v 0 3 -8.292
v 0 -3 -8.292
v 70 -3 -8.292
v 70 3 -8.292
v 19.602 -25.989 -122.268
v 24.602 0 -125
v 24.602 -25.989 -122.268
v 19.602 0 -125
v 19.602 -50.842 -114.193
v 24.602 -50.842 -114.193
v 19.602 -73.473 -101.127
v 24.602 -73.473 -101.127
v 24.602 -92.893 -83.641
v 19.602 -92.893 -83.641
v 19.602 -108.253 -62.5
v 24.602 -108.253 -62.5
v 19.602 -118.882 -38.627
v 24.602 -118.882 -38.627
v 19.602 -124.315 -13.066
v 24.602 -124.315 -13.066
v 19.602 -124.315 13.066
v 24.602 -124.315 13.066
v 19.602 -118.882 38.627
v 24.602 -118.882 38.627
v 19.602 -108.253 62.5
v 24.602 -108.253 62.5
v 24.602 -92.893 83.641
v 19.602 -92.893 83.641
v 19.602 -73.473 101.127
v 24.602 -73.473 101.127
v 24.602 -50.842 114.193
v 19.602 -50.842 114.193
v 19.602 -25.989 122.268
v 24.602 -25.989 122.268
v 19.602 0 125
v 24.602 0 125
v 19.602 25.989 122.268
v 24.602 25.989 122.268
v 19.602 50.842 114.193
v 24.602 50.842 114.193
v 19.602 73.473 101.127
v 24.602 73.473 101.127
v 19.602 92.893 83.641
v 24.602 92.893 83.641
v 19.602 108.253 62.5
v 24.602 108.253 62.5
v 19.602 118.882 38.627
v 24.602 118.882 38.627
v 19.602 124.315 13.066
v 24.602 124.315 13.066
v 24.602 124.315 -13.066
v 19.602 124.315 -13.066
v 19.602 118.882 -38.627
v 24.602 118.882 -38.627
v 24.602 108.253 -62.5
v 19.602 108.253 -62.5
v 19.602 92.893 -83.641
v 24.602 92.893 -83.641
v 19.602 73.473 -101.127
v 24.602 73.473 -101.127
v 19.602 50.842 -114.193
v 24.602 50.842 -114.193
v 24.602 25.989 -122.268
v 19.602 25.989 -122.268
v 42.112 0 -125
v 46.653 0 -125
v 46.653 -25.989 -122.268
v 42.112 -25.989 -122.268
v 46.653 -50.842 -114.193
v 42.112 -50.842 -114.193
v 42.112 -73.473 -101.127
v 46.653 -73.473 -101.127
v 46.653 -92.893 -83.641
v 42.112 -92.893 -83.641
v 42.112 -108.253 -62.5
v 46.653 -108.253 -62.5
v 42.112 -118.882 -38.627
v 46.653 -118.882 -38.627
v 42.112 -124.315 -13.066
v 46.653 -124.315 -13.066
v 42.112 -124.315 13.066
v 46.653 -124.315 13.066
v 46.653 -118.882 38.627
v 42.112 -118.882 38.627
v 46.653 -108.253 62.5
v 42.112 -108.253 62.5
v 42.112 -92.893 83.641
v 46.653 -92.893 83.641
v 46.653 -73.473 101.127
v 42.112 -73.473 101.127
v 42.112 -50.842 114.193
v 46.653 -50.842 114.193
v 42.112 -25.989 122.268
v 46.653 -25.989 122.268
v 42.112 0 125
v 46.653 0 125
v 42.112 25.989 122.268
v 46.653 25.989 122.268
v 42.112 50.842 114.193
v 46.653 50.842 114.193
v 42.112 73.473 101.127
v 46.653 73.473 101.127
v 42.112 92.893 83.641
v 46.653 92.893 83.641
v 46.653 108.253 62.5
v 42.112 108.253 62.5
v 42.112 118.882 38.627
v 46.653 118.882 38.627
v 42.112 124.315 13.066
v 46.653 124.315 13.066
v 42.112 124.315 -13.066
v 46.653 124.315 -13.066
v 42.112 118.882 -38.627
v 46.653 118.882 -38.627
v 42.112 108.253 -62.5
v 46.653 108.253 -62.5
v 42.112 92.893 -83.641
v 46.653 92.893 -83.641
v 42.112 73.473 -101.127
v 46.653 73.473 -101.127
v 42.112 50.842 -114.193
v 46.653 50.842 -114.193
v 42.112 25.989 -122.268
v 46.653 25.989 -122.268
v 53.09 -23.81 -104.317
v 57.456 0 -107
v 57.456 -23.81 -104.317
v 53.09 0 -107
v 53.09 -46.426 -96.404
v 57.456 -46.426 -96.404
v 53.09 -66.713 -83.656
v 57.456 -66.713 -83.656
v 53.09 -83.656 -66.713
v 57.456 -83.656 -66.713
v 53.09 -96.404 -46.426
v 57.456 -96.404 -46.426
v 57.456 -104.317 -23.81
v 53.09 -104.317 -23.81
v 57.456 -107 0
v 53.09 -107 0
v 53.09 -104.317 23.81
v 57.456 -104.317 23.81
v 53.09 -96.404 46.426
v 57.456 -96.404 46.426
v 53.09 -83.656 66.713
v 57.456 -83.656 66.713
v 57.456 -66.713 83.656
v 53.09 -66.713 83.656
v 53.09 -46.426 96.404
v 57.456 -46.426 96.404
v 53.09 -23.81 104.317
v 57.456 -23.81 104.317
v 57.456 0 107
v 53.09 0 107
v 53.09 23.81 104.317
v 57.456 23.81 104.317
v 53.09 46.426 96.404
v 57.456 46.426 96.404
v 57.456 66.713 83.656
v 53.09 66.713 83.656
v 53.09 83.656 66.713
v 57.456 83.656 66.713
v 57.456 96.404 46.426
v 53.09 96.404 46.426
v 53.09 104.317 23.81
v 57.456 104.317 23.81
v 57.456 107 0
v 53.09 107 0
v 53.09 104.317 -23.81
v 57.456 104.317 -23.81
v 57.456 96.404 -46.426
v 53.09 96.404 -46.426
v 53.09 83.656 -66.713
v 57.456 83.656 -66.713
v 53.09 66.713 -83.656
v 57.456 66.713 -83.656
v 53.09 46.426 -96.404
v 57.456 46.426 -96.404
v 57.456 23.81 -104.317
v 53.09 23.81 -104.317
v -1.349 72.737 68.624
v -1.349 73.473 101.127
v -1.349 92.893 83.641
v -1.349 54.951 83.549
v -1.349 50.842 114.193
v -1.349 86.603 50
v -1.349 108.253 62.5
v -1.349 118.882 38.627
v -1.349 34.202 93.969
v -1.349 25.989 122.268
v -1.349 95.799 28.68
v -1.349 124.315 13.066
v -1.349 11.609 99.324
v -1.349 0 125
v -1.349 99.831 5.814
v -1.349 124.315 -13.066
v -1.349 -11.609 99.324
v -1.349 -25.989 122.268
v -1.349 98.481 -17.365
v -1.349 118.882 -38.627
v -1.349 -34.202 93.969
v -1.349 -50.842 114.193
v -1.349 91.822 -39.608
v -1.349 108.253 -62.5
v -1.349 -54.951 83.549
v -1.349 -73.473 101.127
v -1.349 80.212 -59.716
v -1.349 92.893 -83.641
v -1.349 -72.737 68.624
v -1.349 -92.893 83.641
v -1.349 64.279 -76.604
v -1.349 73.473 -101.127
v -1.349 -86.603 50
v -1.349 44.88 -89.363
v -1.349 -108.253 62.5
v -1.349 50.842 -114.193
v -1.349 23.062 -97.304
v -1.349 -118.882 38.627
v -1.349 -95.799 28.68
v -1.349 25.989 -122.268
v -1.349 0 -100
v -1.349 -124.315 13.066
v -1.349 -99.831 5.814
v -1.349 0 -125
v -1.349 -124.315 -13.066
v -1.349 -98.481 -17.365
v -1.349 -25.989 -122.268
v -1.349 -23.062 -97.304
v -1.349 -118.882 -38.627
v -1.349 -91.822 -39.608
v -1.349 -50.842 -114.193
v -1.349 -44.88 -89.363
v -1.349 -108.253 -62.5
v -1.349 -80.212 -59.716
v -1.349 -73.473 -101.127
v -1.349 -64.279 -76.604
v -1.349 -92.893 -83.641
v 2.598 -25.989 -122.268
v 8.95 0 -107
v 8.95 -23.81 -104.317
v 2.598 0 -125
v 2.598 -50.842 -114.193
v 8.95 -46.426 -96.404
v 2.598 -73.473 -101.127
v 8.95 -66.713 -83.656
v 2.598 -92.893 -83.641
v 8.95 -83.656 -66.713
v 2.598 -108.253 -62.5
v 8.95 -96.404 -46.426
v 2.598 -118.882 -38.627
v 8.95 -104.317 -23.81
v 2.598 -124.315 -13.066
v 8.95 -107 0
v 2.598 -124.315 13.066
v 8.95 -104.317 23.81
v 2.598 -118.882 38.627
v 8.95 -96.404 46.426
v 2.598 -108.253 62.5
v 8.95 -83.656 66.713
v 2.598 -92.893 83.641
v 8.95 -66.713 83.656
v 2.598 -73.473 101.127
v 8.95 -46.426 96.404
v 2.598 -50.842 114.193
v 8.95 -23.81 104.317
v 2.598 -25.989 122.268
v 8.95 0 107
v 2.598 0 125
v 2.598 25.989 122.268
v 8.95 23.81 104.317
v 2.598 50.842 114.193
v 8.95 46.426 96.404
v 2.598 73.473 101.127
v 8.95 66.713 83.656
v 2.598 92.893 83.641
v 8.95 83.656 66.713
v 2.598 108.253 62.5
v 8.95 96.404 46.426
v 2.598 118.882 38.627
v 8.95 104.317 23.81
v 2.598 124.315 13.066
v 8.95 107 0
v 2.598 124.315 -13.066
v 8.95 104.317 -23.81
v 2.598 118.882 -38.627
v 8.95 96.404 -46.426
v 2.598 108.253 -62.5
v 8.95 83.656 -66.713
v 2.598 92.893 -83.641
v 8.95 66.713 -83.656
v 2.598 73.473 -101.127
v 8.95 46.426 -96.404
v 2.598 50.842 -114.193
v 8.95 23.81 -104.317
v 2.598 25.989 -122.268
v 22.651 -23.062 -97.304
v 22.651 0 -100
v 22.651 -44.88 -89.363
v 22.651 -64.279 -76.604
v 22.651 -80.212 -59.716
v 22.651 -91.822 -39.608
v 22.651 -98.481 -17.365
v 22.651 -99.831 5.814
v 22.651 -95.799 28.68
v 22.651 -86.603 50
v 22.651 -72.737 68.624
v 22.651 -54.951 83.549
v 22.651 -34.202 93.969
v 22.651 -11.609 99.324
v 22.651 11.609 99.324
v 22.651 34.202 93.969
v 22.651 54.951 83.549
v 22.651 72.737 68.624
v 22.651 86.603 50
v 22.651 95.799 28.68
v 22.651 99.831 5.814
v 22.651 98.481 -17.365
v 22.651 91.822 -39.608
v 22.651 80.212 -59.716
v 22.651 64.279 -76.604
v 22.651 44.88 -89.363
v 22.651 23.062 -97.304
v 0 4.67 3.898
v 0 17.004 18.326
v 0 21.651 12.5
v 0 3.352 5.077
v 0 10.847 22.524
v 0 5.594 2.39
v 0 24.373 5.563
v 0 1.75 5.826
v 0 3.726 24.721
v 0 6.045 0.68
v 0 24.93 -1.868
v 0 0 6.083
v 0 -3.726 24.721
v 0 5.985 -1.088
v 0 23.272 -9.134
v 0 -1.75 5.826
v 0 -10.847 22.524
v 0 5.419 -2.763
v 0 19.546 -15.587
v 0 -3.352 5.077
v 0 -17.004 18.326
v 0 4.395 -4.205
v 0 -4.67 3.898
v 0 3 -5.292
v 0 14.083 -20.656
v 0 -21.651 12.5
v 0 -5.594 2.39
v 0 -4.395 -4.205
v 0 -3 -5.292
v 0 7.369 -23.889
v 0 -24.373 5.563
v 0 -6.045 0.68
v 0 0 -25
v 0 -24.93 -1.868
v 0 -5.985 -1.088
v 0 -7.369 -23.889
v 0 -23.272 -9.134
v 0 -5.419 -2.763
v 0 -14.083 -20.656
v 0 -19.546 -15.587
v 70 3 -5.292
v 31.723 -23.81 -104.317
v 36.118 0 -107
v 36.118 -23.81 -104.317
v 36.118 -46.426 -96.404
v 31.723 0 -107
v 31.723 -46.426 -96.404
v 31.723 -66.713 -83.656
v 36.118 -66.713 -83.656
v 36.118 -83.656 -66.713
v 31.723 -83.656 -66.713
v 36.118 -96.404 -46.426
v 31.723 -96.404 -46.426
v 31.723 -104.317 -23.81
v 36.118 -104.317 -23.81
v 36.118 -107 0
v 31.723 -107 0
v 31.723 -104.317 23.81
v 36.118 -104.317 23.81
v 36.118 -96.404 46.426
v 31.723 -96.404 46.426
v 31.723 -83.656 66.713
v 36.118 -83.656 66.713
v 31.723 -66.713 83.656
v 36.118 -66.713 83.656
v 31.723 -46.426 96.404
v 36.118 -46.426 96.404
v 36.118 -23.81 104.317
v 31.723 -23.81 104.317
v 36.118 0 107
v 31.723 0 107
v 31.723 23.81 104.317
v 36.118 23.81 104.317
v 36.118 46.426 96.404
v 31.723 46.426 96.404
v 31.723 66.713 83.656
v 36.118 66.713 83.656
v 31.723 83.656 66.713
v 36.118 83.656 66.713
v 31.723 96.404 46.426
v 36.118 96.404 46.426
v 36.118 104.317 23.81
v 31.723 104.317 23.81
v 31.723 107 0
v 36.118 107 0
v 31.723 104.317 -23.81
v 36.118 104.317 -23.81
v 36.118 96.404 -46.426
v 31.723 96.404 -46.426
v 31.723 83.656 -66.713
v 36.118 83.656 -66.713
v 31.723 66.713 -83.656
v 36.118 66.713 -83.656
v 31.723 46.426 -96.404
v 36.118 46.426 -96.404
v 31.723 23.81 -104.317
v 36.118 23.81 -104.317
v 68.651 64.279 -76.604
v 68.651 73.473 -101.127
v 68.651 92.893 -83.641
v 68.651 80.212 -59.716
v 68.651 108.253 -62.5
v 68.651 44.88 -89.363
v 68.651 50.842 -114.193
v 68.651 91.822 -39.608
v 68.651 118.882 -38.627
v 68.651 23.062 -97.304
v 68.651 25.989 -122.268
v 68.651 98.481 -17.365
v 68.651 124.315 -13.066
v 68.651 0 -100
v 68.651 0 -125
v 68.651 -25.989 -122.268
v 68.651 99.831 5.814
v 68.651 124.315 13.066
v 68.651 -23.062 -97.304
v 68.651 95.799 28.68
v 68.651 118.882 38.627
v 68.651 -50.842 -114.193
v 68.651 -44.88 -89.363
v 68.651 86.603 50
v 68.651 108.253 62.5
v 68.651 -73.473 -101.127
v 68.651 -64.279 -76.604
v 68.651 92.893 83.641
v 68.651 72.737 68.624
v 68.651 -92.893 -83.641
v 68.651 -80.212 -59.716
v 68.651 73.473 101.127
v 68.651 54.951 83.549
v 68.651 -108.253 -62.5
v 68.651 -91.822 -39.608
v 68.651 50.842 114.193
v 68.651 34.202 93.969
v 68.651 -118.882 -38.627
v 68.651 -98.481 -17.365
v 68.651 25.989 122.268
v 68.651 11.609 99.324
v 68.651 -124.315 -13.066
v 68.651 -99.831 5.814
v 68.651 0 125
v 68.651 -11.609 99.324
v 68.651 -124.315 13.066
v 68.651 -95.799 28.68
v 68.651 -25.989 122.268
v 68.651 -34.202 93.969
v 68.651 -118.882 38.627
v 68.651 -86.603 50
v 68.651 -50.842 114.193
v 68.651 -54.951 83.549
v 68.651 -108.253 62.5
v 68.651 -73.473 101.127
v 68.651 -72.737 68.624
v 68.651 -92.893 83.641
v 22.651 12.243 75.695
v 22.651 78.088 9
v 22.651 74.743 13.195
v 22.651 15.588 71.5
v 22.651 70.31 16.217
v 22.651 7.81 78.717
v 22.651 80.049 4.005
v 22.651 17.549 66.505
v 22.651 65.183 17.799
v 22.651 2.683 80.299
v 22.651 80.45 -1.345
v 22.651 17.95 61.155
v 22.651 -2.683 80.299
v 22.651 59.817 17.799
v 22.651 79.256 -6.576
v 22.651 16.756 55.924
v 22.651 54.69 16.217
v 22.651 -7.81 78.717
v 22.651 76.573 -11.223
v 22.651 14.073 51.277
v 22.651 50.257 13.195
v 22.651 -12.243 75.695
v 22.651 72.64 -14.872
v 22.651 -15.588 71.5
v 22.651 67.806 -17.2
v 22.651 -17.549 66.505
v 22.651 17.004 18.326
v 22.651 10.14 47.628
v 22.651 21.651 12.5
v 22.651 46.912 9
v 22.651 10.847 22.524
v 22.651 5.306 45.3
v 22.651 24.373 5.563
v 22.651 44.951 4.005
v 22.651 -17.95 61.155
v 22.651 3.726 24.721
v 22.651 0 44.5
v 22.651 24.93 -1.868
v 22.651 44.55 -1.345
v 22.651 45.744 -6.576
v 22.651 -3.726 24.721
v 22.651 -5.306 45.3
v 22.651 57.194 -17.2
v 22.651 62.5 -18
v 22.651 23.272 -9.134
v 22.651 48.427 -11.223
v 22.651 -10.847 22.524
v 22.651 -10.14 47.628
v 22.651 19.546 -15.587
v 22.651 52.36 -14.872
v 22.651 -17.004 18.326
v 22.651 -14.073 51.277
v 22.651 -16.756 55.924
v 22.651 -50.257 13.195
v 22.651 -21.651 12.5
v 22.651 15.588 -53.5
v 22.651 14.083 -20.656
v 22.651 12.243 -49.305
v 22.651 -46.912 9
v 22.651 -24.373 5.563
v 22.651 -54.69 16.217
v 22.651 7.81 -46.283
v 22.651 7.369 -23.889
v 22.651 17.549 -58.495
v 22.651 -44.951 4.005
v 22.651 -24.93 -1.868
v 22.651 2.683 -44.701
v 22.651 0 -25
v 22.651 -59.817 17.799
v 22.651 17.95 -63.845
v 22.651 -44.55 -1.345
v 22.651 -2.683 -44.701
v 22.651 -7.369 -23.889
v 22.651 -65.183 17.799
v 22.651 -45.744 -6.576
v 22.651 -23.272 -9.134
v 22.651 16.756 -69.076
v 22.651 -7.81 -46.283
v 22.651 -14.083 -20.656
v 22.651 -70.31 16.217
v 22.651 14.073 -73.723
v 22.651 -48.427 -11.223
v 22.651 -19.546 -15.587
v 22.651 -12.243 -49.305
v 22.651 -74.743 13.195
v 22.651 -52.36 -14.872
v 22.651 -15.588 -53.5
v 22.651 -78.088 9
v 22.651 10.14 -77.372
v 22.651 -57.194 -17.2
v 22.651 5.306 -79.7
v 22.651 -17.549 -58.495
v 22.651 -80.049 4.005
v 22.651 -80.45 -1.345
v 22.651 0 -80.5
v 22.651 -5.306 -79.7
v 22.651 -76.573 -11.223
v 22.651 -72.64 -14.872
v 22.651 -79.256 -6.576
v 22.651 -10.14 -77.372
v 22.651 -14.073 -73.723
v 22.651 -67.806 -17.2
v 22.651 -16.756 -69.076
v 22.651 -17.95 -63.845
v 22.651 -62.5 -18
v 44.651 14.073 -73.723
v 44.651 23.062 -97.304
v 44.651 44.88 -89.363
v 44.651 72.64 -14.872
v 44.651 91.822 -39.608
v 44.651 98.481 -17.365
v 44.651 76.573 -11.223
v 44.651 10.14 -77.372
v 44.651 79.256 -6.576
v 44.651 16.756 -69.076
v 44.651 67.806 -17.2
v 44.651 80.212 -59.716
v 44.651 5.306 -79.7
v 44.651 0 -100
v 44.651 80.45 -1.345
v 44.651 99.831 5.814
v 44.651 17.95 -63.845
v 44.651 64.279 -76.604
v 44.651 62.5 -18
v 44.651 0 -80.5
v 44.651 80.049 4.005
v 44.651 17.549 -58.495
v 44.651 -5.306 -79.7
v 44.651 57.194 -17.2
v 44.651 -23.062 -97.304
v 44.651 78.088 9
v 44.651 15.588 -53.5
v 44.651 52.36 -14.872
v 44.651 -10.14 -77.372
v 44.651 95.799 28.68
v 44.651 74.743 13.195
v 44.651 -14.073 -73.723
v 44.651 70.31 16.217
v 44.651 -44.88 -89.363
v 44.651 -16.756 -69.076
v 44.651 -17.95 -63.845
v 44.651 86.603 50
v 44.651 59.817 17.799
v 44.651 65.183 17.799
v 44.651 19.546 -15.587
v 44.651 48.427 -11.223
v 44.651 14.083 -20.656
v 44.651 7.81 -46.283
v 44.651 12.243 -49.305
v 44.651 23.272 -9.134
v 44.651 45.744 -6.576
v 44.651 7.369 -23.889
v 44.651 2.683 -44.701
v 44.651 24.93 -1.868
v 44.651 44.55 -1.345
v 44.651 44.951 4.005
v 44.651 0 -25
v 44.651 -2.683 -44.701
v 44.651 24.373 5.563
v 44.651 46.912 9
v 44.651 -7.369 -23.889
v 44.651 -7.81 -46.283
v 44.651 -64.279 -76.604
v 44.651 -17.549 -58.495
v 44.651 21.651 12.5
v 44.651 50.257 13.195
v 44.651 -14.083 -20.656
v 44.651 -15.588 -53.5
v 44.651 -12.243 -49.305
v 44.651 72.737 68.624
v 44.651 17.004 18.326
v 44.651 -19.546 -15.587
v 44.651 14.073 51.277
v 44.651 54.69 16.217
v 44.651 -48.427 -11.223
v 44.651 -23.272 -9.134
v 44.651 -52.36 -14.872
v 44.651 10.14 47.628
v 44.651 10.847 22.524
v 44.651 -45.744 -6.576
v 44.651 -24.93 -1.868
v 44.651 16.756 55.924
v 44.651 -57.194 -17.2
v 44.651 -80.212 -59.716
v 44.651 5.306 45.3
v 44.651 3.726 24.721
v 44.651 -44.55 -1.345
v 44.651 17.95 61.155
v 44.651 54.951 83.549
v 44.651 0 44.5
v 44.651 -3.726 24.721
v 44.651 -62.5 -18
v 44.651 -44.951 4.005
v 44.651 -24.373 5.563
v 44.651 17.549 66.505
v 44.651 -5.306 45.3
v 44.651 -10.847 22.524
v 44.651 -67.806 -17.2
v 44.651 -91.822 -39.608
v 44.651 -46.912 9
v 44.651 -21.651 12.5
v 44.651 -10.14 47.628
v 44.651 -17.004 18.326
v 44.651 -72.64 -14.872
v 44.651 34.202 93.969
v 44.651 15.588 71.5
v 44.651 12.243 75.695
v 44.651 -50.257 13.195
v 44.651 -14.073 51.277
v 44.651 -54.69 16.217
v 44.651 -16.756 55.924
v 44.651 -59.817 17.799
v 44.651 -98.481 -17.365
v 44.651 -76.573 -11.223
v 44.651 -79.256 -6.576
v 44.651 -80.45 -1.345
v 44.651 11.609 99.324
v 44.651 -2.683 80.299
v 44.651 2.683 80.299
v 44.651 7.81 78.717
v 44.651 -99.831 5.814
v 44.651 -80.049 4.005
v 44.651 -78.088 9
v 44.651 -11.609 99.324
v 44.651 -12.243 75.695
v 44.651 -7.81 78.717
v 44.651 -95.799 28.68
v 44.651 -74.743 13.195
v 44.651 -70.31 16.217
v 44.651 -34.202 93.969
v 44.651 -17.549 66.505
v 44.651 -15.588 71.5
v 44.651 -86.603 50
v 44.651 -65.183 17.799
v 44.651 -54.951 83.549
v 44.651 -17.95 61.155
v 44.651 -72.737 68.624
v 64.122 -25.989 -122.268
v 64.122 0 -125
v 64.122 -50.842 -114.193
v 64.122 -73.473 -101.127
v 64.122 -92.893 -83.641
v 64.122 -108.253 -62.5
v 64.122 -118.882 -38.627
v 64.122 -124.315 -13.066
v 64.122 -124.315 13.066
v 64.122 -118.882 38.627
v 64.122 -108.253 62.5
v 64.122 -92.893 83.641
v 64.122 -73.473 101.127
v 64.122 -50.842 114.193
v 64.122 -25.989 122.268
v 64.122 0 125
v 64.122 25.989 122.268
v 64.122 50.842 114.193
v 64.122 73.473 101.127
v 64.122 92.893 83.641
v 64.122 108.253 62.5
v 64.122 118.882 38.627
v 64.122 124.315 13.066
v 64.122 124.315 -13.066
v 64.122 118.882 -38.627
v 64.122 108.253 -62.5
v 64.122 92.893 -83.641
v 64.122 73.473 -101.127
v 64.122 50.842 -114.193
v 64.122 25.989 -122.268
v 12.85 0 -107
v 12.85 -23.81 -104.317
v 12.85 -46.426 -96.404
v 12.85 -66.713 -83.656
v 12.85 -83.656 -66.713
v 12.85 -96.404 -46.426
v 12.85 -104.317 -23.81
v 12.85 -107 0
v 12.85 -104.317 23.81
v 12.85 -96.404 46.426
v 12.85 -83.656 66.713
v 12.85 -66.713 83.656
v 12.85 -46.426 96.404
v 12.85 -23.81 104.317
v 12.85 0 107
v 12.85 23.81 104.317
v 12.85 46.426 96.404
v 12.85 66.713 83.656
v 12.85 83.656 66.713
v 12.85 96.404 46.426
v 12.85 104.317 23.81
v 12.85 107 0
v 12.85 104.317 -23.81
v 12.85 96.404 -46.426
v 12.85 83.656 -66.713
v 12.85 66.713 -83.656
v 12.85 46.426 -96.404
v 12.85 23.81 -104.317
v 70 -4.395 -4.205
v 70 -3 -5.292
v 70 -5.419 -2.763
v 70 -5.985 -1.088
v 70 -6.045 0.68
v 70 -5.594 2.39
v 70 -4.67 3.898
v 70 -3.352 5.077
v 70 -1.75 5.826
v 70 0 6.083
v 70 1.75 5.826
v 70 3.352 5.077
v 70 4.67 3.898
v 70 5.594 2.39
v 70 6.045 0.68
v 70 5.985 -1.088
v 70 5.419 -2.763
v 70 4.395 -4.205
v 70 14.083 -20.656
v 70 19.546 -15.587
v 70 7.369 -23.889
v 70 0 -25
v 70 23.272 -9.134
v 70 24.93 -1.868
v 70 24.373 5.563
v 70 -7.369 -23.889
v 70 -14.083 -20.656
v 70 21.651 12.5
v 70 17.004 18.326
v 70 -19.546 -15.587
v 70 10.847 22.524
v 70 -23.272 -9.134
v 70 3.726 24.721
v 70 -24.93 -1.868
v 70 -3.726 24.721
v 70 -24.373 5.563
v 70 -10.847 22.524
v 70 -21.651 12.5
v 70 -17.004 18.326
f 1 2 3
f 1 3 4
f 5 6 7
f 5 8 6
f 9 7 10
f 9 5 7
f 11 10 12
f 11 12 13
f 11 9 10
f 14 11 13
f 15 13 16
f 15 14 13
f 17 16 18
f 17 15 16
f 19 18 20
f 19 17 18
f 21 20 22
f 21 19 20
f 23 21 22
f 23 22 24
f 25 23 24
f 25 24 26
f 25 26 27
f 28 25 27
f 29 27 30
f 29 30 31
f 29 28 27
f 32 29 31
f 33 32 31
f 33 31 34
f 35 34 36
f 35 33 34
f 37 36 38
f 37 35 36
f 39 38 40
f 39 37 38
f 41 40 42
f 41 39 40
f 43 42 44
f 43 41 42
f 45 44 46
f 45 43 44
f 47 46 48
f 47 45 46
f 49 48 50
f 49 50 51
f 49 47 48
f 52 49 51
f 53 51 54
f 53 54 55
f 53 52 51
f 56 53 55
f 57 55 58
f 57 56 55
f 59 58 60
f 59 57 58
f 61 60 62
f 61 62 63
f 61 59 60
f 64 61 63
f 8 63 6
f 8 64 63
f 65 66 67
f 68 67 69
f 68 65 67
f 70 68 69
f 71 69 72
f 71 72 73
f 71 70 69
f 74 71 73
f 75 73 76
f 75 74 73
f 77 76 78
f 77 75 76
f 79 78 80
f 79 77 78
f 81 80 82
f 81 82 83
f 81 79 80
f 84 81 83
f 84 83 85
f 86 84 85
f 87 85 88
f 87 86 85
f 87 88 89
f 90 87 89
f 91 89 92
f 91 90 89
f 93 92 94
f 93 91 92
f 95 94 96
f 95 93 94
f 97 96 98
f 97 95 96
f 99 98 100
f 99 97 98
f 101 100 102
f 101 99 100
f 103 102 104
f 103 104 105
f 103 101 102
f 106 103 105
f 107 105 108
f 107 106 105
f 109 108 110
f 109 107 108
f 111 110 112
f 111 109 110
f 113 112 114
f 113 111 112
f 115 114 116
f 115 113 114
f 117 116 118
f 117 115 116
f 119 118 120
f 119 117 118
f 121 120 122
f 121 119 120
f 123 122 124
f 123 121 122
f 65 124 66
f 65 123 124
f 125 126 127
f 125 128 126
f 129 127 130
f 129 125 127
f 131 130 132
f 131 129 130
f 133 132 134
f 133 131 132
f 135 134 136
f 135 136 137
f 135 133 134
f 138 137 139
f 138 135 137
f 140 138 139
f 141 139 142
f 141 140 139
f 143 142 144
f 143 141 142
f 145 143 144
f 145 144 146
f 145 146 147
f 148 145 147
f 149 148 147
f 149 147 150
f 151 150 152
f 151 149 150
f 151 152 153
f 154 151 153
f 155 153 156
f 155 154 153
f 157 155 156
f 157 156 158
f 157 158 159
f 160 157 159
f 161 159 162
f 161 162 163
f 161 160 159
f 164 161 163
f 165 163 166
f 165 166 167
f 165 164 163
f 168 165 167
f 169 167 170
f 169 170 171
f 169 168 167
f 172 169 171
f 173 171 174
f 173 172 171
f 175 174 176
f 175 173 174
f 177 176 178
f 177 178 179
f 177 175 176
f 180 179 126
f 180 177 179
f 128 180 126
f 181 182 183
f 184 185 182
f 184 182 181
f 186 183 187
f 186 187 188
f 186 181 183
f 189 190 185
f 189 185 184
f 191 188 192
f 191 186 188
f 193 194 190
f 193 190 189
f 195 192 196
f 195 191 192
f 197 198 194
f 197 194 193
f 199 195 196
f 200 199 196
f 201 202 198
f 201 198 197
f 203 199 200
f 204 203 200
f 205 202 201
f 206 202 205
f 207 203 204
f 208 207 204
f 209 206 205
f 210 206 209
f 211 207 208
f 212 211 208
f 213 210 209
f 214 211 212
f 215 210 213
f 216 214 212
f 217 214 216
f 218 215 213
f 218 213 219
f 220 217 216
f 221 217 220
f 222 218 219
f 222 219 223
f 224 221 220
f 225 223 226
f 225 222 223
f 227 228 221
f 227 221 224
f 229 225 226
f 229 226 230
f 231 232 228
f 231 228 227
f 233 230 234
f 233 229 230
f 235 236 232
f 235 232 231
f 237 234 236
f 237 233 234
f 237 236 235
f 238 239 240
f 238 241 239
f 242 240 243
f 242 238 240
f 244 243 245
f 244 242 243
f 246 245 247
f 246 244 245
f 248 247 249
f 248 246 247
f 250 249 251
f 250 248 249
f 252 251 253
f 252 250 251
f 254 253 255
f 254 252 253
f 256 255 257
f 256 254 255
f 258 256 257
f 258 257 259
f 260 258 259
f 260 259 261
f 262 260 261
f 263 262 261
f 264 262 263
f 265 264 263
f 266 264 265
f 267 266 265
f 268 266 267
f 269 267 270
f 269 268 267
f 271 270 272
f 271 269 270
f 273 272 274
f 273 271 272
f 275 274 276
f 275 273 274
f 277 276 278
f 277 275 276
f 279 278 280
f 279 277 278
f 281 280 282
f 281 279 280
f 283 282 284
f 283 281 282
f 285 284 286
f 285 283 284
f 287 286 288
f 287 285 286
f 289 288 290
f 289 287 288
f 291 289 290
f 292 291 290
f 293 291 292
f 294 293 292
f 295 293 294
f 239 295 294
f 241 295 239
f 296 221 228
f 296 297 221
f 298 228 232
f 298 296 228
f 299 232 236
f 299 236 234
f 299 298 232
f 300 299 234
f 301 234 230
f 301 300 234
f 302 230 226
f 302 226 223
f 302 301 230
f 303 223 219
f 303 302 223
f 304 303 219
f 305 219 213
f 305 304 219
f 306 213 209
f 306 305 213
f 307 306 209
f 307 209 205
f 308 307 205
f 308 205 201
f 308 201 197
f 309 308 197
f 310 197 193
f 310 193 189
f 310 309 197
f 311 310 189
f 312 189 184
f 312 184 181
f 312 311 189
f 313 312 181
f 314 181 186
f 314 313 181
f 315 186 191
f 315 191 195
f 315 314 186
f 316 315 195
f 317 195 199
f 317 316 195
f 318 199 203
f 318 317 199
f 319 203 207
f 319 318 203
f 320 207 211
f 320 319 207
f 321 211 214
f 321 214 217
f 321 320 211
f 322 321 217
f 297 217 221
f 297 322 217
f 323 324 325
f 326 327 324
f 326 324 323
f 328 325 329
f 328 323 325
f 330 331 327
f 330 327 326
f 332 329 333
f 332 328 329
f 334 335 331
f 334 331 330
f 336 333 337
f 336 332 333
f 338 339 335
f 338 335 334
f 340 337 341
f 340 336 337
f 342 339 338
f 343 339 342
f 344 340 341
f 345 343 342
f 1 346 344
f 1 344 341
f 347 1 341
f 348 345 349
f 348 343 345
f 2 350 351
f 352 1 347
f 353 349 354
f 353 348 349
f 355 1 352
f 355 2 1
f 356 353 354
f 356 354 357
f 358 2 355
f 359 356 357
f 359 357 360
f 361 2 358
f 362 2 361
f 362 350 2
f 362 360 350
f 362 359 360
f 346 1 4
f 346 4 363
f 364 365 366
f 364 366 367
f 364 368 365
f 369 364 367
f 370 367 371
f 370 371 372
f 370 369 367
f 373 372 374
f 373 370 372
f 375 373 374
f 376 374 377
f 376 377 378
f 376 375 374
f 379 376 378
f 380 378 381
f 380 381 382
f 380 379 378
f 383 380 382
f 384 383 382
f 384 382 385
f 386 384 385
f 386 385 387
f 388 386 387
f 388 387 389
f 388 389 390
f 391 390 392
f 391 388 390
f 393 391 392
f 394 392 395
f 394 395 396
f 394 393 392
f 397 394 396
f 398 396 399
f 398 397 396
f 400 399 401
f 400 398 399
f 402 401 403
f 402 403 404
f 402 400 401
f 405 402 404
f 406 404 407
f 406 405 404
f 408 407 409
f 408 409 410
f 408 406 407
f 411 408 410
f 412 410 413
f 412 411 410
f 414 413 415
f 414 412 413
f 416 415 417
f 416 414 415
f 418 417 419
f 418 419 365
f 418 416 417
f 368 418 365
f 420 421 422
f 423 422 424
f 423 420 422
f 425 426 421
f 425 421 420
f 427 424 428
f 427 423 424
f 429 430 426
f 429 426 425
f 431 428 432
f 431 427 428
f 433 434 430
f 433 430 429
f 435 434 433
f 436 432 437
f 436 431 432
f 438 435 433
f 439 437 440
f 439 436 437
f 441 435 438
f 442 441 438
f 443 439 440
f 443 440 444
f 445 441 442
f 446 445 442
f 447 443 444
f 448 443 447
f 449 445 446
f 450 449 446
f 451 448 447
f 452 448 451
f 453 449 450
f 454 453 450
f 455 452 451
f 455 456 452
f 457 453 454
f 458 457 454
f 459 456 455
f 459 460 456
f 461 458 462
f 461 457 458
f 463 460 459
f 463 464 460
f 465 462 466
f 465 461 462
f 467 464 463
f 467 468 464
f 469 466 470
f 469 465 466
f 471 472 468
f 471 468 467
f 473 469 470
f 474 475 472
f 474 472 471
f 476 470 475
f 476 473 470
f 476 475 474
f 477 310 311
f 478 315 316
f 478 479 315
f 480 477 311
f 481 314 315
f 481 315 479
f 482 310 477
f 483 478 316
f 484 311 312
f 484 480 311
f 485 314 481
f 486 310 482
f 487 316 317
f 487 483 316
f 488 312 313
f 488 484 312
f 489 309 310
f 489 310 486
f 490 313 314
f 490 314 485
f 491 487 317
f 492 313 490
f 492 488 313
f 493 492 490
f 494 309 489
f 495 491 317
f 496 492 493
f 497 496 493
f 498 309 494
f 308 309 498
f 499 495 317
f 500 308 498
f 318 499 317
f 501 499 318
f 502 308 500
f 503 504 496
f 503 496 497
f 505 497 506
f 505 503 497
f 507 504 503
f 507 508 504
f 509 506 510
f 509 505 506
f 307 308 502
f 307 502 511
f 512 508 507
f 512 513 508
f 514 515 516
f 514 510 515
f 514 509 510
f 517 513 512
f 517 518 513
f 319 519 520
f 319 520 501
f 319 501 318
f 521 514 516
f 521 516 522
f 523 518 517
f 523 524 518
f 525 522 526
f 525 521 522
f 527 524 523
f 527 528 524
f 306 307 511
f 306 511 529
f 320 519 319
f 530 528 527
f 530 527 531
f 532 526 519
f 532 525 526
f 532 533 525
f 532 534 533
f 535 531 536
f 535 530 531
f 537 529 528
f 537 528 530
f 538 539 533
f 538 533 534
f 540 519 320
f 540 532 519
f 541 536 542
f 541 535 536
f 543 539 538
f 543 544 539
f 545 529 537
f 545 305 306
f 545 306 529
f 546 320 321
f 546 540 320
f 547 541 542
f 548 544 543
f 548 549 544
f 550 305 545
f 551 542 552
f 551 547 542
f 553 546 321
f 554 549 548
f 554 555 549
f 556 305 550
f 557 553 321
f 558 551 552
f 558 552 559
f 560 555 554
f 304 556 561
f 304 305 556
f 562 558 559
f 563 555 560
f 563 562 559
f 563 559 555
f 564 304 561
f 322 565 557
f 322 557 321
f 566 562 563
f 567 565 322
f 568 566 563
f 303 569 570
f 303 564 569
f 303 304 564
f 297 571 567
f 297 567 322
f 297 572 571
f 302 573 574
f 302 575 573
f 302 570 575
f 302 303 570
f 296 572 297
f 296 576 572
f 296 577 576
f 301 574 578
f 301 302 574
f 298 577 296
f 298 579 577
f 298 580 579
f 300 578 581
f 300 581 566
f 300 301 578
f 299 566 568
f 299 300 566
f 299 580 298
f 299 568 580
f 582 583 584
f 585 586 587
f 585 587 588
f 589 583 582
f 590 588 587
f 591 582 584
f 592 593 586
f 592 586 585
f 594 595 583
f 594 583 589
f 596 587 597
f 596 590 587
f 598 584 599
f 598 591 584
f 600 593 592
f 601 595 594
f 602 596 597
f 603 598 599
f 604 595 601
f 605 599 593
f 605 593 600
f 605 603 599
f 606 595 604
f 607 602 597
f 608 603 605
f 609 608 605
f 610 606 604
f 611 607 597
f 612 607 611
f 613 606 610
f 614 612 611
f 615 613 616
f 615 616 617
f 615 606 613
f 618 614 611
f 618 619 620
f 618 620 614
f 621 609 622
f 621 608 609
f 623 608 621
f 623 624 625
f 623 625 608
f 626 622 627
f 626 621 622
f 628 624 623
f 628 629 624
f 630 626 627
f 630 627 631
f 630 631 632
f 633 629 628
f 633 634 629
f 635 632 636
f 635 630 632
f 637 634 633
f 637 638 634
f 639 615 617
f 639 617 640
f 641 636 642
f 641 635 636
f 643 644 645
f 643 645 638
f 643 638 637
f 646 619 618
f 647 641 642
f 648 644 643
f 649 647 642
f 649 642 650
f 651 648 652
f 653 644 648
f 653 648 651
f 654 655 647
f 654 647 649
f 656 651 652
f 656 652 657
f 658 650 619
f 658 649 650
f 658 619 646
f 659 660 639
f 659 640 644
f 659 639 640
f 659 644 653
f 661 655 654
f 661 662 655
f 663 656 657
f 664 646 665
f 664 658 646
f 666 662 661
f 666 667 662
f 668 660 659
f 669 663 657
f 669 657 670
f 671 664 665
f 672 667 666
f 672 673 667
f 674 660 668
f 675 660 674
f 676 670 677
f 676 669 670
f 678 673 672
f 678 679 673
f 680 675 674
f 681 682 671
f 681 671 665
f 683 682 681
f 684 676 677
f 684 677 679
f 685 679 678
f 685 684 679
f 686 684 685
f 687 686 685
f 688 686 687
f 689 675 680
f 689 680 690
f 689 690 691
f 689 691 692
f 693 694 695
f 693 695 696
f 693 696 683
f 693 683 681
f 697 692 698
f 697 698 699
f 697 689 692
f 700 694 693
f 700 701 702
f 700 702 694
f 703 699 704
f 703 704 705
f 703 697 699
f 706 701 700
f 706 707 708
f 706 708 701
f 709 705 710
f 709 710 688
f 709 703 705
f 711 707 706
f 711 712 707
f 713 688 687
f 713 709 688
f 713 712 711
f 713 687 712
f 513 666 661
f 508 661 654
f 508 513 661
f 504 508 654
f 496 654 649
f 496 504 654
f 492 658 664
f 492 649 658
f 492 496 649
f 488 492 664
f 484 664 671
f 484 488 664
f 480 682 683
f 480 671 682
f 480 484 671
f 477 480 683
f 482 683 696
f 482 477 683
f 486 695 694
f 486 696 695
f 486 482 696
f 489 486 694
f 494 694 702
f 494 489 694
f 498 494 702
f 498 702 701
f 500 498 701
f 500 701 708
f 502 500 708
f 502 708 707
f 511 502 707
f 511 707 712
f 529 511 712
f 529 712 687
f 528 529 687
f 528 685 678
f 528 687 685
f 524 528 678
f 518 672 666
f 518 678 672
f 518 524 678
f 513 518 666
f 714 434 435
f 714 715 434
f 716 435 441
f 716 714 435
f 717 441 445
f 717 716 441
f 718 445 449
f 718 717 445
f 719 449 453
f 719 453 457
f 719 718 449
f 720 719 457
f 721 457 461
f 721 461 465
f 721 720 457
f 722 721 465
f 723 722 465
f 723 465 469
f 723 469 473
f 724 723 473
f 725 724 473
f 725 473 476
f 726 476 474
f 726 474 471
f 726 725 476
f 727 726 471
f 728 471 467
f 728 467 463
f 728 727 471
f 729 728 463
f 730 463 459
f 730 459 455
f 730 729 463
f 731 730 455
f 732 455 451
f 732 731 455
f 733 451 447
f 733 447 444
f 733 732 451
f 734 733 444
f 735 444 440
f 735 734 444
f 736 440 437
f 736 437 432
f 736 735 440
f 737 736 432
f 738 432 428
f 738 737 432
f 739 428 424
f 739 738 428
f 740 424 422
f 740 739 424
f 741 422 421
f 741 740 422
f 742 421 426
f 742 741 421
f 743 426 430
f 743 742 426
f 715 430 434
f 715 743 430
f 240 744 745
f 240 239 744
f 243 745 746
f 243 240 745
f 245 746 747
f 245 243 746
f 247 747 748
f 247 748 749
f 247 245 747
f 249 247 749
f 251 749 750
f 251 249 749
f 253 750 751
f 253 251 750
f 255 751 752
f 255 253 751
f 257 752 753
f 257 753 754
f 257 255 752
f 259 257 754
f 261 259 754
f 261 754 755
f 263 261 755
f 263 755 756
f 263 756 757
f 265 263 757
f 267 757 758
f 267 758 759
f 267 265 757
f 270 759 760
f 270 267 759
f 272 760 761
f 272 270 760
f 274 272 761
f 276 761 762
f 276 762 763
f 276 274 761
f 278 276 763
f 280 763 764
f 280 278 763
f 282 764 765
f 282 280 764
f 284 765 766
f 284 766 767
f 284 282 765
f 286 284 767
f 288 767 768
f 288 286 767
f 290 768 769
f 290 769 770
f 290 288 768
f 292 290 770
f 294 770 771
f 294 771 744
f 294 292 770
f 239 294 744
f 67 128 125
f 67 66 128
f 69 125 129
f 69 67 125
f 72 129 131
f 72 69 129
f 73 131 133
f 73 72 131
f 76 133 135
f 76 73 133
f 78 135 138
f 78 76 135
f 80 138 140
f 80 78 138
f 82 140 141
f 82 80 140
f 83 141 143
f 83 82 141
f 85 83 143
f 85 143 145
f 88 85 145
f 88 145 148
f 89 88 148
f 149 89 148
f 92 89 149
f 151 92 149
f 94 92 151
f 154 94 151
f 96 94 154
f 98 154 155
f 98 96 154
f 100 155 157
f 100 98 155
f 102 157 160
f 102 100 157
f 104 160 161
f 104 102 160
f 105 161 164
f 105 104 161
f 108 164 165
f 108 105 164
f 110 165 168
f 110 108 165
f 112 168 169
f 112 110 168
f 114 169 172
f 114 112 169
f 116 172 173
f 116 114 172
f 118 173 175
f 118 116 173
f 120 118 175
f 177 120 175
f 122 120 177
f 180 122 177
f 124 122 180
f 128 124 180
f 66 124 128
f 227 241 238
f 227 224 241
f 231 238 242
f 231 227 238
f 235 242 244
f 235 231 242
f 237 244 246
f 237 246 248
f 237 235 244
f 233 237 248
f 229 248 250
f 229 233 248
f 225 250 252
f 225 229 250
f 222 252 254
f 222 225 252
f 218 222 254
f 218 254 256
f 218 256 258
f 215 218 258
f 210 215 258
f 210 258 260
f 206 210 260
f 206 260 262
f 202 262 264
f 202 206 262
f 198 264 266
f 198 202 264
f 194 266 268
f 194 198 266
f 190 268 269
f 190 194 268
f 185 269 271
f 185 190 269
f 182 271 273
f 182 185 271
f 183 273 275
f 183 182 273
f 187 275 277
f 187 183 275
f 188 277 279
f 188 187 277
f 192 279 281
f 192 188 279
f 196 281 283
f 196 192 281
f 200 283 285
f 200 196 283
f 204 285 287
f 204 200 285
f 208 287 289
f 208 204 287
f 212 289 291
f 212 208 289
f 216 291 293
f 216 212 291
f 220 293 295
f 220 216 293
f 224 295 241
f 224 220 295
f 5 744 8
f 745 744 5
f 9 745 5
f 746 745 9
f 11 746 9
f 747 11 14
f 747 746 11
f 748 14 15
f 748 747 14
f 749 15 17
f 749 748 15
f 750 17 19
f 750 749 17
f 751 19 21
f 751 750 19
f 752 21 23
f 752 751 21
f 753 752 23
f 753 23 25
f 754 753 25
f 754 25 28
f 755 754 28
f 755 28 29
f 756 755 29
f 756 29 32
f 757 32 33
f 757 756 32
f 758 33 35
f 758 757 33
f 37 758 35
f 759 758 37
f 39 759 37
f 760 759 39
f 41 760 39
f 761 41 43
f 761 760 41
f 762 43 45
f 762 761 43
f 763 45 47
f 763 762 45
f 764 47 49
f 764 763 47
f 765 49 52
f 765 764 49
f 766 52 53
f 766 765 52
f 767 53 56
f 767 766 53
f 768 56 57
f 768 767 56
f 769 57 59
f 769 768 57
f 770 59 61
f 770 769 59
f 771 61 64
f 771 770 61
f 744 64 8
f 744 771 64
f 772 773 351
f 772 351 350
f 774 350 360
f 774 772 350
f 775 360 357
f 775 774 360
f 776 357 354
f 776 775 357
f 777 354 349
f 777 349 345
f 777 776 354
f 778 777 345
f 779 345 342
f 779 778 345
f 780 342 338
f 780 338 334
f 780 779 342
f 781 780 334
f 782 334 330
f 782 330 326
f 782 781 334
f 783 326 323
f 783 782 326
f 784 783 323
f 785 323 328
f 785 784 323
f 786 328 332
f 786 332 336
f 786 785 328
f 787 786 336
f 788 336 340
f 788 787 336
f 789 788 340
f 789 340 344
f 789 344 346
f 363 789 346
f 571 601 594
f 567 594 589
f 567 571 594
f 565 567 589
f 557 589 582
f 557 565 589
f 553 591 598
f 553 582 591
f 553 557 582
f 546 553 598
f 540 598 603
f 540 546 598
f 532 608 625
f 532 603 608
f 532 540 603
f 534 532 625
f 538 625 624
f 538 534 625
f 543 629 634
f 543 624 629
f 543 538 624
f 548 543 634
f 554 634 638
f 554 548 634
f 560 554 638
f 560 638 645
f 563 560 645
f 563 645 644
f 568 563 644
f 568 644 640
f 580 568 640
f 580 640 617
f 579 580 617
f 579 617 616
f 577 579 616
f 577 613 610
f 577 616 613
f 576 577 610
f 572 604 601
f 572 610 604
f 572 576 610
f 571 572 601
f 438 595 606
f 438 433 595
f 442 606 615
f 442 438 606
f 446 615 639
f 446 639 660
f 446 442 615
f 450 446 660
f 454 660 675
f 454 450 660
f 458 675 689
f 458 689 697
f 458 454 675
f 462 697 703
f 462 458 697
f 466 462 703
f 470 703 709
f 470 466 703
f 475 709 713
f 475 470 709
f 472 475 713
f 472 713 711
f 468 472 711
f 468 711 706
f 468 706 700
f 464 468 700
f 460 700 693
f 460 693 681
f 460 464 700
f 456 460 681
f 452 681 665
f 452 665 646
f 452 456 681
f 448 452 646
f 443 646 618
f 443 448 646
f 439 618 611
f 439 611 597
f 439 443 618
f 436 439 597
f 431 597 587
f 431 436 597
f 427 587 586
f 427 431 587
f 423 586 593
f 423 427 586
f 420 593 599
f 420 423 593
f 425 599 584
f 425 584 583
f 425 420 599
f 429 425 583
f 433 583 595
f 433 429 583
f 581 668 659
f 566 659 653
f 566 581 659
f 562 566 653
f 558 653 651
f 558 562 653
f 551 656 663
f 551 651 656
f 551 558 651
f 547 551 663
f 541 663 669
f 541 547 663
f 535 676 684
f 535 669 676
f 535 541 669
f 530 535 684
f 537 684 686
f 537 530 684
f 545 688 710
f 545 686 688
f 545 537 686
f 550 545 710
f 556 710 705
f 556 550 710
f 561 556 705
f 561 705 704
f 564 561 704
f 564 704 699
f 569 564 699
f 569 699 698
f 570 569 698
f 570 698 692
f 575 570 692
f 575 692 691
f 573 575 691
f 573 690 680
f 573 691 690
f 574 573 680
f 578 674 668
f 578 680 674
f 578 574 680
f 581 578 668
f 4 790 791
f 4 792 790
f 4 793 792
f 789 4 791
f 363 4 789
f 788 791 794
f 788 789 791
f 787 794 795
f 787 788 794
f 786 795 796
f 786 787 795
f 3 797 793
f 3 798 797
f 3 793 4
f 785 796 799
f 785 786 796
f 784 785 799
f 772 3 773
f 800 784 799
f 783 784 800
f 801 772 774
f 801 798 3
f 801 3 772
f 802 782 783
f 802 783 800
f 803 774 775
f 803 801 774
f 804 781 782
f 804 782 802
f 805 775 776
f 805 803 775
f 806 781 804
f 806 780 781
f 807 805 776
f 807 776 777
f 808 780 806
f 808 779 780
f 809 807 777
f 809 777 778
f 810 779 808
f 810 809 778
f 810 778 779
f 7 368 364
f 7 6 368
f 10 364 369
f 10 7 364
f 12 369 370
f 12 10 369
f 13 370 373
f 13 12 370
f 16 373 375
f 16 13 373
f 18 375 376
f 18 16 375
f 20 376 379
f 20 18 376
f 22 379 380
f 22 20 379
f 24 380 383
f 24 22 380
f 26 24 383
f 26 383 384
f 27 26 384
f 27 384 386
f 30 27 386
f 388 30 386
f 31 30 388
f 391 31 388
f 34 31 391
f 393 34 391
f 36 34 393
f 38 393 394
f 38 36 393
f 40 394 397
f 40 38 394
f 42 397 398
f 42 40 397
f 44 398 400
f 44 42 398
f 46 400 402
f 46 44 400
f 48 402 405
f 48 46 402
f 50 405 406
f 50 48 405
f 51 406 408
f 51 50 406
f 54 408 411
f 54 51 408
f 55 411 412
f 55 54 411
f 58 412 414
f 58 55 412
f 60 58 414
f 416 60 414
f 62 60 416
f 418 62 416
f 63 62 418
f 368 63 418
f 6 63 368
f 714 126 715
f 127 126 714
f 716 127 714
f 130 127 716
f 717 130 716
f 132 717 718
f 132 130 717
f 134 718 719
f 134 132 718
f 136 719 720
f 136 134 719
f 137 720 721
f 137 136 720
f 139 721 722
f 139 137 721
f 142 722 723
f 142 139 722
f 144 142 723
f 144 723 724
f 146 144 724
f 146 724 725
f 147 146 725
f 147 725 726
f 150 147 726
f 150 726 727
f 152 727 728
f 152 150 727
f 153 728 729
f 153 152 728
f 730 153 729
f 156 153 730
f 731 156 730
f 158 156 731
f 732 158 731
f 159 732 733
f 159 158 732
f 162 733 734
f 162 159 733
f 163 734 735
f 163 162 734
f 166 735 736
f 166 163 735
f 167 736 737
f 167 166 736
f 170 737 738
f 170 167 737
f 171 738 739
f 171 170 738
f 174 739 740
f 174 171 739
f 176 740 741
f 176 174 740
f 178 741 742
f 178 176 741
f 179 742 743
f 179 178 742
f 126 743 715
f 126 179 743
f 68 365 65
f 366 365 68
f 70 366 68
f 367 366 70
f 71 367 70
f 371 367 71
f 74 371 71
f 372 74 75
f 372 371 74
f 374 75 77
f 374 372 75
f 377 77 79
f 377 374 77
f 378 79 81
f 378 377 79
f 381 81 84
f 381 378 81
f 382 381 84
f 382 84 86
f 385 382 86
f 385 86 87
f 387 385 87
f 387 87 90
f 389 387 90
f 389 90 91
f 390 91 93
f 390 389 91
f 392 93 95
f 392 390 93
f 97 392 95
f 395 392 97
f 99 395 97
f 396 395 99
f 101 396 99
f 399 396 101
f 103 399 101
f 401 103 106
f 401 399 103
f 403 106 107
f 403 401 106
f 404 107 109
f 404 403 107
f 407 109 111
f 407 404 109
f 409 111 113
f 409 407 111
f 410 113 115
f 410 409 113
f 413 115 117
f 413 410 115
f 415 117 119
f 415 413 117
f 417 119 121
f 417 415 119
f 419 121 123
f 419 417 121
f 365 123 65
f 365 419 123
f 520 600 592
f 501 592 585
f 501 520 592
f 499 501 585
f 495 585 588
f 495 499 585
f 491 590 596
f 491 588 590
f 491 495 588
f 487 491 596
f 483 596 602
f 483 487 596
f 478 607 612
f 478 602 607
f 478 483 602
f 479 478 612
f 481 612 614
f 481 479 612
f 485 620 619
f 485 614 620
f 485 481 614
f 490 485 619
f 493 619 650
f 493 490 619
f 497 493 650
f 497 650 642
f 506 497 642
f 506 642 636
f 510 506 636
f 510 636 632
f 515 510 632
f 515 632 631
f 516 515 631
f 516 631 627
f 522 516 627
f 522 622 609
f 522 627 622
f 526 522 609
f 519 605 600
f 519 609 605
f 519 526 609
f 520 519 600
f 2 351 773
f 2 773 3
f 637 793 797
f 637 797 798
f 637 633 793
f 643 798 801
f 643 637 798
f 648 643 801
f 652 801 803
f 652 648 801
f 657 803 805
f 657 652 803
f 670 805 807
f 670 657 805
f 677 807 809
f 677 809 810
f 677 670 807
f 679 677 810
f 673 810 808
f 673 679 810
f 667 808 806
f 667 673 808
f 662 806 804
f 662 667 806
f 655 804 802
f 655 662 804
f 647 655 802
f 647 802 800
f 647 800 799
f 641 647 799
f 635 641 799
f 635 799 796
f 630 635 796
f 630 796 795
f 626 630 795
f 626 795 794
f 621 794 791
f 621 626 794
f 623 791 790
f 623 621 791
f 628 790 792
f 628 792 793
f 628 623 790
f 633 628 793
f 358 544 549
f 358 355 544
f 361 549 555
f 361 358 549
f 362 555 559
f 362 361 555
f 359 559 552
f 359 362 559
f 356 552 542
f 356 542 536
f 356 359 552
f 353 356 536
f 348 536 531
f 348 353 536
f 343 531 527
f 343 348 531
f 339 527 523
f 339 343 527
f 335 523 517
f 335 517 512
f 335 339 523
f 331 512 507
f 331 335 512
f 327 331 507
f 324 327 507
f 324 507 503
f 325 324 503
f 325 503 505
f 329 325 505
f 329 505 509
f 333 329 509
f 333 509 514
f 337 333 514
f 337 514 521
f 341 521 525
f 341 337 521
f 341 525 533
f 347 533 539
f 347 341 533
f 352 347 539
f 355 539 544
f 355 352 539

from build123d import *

# Parameters (mm, degrees)
SKETCH4_R          = 18
CUT_EXTRUDE2_DEPTH = 191.632264763


with BuildPart() as part:
    # Sketch1 → Revolve2 (revolve)
    with BuildSketch(Plane(origin=(0, 0, 0), x_dir=(1, 0, 0), z_dir=(0, 1, 0))):
        Polygon((0, 6.083202512), (70, 6.083202512), (70, 25), (44.651136178, 25), (44.651136178, 100), (68.651136178, 100), (68.651136178, 125), (64.121995326, 125), (57.455679022, 107), (53.089915226, 107), (46.652833964, 125), (42.111811271, 125), (36.118360649, 107), (31.722806927, 107), (24.601983551, 125), (19.601983551, 125), (12.850084898, 107), (8.95007039, 107), (2.597616176, 125), (-1.348863822, 125), (-1.348863822, 100), (22.651136178, 100), (22.651136178, 25), (0, 25), align=None)
    revolve(axis=Axis((70, 0, 0), (-1, 0, 0)))

    # Sketch4 → Cut-Extrude2 (cut, through all)
    with BuildSketch(Plane(origin=(70, 0, 0), x_dir=(0, 0, -1), z_dir=(1, 0, 0))):
        with BuildLine():
            Line((5.29200839, -3), (8.29200839, -3))
            Line((8.29200839, -3), (8.29200839, 3))
            Line((8.29200839, 3), (5.29200839, 3))
            ThreePointArc((5.29200839, 3), (6.083202512, 0), (5.29200839, -3))
        make_face()
        with Locations((62.5, 0)):
            Circle(SKETCH4_R)
        with Locations((0, 62.5)):
            Circle(SKETCH4_R)
        with Locations((0, -62.5)):
            Circle(SKETCH4_R)
        with Locations((-62.5, 0)):
            Circle(SKETCH4_R)
    extrude(amount=-CUT_EXTRUDE2_DEPTH, mode=Mode.SUBTRACT)


solid = part.part
